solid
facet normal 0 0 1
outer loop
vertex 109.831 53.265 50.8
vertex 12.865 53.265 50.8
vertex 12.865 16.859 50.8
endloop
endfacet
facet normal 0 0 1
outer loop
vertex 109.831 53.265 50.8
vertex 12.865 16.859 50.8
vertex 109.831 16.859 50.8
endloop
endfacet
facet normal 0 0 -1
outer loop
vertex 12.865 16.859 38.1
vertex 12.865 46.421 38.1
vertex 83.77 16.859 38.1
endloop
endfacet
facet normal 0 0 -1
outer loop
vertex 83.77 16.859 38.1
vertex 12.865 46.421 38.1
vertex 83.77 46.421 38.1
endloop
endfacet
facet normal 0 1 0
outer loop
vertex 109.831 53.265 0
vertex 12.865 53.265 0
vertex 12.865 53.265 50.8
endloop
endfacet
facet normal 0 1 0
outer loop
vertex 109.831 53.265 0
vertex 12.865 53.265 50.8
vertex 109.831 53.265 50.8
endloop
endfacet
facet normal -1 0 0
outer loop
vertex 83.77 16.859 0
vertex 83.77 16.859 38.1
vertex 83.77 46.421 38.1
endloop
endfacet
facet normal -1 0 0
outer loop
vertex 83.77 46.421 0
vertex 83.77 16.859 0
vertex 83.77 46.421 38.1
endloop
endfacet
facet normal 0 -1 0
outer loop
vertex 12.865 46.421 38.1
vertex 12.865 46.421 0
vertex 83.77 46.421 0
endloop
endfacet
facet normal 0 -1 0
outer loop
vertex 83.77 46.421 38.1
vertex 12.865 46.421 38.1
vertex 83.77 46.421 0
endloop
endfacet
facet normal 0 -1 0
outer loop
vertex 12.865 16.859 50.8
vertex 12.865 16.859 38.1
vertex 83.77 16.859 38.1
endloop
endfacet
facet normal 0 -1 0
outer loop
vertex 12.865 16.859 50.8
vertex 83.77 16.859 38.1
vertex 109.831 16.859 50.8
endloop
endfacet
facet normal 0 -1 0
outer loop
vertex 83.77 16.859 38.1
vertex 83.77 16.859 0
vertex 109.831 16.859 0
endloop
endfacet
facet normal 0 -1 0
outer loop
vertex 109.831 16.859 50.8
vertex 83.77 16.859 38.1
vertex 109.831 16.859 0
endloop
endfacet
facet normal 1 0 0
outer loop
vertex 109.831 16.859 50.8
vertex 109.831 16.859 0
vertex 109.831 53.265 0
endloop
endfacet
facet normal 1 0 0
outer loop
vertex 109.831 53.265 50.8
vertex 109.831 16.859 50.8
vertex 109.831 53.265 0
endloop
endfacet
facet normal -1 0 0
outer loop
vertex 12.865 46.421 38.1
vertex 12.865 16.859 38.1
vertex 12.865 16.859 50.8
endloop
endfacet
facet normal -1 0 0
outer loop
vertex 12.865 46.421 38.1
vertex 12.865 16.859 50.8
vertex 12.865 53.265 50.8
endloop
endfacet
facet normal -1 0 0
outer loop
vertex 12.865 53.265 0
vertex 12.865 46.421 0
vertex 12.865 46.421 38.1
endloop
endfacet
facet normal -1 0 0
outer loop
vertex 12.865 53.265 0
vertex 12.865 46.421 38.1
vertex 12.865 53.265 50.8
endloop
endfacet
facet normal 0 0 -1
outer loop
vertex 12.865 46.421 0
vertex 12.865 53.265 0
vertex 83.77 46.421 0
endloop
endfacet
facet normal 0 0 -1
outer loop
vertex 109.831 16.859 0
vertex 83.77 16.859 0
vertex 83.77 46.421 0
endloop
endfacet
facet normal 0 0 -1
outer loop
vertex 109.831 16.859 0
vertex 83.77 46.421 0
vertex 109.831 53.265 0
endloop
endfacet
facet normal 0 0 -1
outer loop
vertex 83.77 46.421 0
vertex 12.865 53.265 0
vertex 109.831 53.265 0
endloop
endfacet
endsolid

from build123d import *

# Parameters (mm, degrees)
F0_W      = 144.2271173
F0_H      = 81.7665755749
F1_DEPTH  = 25.4
F2_W      = 96.966505982
F2_H      = 36.4053957164
F3_DEPTH  = 50.8
F4_OFFSET = 12.7


with BuildPart() as f1:
    # F0 (on Top) → F1 (new body)
    with BuildSketch(Plane.XY):
        with Locations((-1.0436475277, -7.1625672281)):
            Rectangle(F0_W, F0_H)
    extrude(amount=F1_DEPTH)


with BuildPart() as f3:
    # F2 (on Top) → F3 (new body)
    with BuildSketch(Plane.XY):
        with Locations((61.348229181, 35.0621510297)):
            Rectangle(F2_W, F2_H)
    extrude(amount=F3_DEPTH)

    # F4: cut F1, made larger all round first
    f4_tool = offset(f1.part, amount=F4_OFFSET, kind=Kind.INTERSECTION, mode=Mode.PRIVATE)
    add(f4_tool, mode=Mode.SUBTRACT)


solid = f3.part
